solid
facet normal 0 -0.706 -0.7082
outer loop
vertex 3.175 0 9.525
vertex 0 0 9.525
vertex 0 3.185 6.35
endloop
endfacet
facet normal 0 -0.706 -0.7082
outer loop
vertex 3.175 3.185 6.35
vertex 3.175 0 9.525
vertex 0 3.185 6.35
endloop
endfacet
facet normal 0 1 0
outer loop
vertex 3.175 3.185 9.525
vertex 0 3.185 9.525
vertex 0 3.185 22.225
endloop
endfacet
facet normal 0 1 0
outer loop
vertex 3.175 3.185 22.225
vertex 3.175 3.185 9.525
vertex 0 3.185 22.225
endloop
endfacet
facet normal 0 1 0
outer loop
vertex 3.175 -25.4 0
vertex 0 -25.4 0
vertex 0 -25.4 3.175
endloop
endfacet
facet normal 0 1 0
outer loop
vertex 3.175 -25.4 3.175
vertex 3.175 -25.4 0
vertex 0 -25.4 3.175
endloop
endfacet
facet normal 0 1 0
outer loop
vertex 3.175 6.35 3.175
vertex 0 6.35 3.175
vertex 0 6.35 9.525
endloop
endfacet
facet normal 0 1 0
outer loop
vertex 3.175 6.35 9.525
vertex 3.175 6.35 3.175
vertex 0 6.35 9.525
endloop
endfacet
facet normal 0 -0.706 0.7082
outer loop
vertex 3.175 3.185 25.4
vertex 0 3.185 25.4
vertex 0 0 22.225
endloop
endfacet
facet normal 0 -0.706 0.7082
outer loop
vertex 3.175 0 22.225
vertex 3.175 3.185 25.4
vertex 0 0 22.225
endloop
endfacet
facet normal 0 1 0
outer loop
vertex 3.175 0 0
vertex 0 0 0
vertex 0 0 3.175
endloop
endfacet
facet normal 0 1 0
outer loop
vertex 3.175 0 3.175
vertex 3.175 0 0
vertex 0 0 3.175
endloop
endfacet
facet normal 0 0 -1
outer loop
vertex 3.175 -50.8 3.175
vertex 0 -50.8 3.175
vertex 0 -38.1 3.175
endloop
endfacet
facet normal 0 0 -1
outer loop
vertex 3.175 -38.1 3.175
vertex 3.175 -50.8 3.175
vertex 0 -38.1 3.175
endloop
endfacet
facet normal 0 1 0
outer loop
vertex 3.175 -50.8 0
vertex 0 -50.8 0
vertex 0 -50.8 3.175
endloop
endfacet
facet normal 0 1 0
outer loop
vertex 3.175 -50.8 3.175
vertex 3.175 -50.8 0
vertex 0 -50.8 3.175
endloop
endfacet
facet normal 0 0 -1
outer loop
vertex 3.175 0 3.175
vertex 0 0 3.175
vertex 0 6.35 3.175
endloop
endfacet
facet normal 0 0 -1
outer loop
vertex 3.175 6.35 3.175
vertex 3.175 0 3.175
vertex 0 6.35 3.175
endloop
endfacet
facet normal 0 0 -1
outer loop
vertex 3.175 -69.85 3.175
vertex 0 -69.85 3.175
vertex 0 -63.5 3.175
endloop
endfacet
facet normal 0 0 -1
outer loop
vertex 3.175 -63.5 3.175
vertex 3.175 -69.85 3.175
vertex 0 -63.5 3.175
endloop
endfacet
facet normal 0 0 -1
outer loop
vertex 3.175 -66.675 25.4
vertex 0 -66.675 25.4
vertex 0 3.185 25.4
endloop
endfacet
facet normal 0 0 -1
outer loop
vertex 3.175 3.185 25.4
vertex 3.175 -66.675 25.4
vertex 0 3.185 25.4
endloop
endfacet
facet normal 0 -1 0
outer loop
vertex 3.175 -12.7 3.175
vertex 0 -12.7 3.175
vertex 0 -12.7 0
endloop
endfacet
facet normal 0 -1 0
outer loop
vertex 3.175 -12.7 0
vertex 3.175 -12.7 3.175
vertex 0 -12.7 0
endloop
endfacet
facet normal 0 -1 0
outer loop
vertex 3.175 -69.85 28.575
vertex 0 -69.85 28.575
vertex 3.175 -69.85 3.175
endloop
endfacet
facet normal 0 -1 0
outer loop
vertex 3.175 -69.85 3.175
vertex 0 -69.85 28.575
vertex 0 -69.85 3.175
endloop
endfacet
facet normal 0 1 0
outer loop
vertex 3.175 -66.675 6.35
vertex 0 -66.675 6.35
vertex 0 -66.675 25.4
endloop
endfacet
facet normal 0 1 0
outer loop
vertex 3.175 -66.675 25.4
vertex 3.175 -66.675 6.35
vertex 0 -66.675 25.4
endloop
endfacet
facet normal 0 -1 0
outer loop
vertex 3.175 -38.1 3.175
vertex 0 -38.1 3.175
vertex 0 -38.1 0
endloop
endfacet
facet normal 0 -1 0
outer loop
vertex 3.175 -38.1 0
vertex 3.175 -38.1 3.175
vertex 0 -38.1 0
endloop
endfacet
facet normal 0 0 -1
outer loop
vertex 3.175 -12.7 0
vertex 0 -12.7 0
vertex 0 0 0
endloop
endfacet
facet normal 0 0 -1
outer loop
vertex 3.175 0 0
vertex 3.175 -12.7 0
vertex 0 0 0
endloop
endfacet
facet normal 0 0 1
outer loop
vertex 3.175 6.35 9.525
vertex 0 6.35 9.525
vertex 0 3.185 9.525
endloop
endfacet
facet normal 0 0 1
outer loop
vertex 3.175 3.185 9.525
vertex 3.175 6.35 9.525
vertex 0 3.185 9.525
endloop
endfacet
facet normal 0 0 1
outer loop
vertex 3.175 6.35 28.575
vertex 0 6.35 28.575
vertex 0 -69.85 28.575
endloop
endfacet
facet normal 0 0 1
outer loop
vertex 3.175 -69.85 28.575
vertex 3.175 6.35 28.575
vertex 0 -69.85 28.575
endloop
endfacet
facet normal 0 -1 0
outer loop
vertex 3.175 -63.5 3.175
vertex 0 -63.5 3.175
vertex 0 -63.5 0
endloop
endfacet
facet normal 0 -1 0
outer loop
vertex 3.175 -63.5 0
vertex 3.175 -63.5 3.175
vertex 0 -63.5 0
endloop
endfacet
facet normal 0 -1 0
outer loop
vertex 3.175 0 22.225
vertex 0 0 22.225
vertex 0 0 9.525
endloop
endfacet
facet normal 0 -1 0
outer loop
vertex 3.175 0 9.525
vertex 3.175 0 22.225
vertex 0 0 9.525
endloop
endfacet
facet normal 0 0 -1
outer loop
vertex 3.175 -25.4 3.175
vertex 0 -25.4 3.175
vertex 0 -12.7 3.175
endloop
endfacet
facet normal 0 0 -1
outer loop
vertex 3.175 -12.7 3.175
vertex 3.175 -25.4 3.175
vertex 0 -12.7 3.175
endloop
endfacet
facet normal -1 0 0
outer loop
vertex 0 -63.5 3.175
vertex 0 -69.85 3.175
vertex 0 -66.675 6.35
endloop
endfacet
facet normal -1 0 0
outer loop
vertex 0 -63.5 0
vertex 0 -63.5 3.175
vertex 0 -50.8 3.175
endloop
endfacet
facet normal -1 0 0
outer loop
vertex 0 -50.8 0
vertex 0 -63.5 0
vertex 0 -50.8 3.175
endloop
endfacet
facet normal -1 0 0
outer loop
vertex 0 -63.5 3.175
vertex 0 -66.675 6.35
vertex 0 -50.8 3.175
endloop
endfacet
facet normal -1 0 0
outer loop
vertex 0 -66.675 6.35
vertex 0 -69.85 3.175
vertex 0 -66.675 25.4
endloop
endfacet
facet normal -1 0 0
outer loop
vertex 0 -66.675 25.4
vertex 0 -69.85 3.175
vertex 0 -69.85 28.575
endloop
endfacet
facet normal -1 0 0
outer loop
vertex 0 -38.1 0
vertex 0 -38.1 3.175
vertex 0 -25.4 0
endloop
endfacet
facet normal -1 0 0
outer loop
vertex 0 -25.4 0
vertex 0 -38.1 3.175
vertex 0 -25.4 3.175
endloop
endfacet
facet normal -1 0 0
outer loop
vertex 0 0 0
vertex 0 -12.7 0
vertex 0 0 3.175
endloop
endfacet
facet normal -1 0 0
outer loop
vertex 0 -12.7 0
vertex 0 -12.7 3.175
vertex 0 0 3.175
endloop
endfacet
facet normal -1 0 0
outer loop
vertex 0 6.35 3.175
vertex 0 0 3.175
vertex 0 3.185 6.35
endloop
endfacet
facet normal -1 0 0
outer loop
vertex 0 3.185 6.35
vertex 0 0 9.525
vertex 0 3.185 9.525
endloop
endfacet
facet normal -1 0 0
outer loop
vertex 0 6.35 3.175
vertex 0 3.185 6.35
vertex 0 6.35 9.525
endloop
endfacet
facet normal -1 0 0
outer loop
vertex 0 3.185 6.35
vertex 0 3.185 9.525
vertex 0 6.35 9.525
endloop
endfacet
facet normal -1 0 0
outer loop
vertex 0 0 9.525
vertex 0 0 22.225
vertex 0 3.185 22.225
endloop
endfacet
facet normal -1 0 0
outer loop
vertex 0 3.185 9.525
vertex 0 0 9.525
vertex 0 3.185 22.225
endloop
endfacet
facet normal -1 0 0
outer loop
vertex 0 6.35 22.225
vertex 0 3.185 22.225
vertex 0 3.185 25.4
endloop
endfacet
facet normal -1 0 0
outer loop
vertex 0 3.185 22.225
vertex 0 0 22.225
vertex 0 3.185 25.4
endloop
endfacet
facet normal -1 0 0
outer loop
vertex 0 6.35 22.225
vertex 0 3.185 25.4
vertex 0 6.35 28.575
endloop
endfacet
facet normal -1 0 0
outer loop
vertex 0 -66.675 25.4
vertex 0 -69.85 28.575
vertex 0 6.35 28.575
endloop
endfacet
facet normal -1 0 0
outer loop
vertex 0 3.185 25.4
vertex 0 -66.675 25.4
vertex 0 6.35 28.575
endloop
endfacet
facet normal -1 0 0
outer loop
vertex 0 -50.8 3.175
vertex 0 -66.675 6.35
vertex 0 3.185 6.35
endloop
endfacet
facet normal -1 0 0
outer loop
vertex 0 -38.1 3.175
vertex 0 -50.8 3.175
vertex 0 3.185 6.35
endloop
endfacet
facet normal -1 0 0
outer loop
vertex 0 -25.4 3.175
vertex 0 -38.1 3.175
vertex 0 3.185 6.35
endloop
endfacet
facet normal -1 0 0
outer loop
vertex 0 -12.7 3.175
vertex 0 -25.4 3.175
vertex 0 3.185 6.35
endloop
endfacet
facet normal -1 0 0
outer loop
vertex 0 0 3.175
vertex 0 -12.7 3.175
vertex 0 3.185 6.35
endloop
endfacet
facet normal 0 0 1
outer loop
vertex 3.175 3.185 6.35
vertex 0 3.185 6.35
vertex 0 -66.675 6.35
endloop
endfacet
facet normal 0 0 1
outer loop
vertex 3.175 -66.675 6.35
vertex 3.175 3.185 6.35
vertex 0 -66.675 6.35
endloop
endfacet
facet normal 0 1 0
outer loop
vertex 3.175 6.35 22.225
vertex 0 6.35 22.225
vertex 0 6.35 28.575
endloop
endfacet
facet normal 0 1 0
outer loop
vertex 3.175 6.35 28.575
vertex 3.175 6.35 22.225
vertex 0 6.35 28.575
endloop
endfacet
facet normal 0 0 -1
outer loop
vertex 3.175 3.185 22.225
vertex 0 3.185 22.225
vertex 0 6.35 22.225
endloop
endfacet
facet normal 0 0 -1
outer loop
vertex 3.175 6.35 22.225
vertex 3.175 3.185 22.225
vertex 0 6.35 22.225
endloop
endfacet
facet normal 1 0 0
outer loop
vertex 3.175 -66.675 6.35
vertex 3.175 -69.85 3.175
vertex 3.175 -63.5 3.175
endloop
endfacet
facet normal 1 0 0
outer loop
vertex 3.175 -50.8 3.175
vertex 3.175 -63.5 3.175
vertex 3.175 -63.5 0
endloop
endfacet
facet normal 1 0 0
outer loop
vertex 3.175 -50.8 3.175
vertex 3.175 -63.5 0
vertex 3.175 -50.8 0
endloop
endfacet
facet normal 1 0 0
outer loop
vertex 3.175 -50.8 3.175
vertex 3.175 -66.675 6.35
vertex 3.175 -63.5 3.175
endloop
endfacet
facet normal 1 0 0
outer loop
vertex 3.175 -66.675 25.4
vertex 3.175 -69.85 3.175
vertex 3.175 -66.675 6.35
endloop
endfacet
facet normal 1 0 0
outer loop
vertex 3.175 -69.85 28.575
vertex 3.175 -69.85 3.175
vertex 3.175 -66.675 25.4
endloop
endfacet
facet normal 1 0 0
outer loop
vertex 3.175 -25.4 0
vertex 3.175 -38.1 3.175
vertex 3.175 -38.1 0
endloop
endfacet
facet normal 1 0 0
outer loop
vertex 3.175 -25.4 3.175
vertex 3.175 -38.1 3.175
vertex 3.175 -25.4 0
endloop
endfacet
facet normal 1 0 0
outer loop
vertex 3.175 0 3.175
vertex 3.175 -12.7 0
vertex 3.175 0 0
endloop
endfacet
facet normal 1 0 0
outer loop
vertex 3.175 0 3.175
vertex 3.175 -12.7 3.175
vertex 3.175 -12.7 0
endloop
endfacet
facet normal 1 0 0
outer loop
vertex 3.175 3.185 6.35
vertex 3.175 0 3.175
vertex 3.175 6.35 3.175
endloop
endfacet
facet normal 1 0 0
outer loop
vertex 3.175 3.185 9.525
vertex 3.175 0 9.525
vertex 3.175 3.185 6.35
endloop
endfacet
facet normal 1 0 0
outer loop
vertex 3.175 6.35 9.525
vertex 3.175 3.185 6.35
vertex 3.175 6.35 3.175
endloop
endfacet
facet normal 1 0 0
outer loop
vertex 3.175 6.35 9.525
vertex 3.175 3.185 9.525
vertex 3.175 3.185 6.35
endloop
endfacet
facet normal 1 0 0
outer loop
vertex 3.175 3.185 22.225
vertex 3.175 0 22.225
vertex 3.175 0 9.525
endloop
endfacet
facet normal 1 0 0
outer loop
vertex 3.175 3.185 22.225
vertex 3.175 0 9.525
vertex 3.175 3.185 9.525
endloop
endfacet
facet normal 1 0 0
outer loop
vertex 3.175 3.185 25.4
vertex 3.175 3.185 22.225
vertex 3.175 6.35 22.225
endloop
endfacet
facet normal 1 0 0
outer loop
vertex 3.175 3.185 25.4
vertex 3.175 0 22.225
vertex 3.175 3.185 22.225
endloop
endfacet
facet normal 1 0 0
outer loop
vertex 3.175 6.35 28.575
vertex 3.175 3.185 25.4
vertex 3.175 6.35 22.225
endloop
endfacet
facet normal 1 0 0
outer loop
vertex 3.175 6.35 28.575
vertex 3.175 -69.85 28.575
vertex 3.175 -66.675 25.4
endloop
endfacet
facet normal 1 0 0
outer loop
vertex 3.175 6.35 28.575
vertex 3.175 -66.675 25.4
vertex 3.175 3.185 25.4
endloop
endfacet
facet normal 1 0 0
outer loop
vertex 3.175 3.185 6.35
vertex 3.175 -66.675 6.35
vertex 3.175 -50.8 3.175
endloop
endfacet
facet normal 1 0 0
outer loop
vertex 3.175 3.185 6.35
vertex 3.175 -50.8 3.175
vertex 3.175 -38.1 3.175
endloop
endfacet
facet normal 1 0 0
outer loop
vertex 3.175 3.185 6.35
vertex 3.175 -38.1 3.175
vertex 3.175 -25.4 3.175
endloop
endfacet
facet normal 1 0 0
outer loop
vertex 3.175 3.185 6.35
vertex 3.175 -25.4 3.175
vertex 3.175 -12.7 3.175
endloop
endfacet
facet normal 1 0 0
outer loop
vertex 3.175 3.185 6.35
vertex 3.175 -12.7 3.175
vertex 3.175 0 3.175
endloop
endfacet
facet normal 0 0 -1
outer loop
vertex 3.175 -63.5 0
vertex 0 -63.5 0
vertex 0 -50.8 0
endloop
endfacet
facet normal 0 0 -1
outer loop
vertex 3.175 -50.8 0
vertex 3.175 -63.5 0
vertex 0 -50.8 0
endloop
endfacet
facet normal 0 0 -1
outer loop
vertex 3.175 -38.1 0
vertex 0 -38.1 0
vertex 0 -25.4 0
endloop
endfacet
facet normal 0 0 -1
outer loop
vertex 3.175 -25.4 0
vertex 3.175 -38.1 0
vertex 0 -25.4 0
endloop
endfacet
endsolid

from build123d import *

# Parameters (mm, degrees)
F1_DEPTH = 3.175


with BuildPart() as f1:
    # F0 (on Right) → F1 (new body)
    with BuildSketch(Plane.YZ):
        Polygon((-12.7, 0), (0, 0), (0, 3.175), (6.35, 3.175), (6.35, 9.525), (3.184586, 9.525), (3.184586, 22.225), (6.35, 22.225), (6.35, 28.575), (-69.85, 28.575), (-69.85, 25.4), (-69.85, 3.175), (-63.5, 3.175), (-63.5, 0), (-50.8, 0), (-50.8, 3.175), (-38.1, 3.175), (-38.1, 0), (-25.4, 0), (-25.4, 3.175), (-12.7, 3.175), align=None)
        Polygon((-66.675, 6.35), (-66.675, 25.4), (3.184586, 25.4), (0, 22.225), (0, 9.525), (3.184586, 6.35), align=None, mode=Mode.SUBTRACT)
    extrude(amount=F1_DEPTH)


solid = f1.part
